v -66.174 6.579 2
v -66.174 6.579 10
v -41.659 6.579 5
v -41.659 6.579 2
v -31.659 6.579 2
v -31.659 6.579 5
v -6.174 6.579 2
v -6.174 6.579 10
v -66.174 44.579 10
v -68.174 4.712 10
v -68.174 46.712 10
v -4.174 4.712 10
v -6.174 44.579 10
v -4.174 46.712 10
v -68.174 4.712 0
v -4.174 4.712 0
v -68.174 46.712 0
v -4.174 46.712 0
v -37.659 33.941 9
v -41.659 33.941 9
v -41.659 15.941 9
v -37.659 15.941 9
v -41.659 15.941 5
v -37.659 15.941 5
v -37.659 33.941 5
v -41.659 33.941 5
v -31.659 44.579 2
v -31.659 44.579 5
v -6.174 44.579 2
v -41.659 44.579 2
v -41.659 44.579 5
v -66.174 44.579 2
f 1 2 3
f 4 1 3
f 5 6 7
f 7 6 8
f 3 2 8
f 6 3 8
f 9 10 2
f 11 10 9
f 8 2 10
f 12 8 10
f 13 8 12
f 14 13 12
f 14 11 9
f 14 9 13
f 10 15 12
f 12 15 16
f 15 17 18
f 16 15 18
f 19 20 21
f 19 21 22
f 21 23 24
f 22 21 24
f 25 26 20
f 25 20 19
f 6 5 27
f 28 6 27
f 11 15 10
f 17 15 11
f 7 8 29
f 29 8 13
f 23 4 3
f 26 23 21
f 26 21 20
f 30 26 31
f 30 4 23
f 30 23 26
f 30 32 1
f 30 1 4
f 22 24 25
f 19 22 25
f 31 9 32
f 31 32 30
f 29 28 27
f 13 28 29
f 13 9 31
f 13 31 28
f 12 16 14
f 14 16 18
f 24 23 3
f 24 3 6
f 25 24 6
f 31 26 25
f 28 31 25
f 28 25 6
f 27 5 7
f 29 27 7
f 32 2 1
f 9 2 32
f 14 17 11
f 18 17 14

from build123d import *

# Parameters (mm, degrees)
F0_W     = 64
F0_H     = 42
F1_DEPTH = 10
F2_W     = 60
F2_H     = 38
F3_DEPTH = 8
F4_W     = 10
F4_H     = 38
F5_DEPTH = 3
F6_W     = 4
F6_H     = 18
F7_DEPTH = 4


with BuildPart() as f1:
    # F0 (on Top) → F1 (new body)
    with BuildSketch(Plane.XY):
        with Locations((-36.174386, 25.71162)):
            Rectangle(F0_W, F0_H)
    extrude(amount=F1_DEPTH)

    # F2 (on face) → F3 (cut)
    with BuildSketch(Plane.XY.offset(10)):
        with Locations((-36.174389, 25.579226)):
            Rectangle(F2_W, F2_H)
    extrude(amount=-F3_DEPTH, mode=Mode.SUBTRACT)

    # F4 (on face) → F5 (join)
    with BuildSketch(Plane.XY.offset(2)):
        with Locations((-36.658923, 25.579226)):
            Rectangle(F4_W, F4_H)
    extrude(amount=F5_DEPTH)

    # F6 (on face) → F7 (join)
    with BuildSketch(Plane.XY.offset(5)):
        with Locations((-39.658923, 24.941399)):
            Rectangle(F6_W, F6_H)
    extrude(amount=F7_DEPTH)


solid = f1.part
